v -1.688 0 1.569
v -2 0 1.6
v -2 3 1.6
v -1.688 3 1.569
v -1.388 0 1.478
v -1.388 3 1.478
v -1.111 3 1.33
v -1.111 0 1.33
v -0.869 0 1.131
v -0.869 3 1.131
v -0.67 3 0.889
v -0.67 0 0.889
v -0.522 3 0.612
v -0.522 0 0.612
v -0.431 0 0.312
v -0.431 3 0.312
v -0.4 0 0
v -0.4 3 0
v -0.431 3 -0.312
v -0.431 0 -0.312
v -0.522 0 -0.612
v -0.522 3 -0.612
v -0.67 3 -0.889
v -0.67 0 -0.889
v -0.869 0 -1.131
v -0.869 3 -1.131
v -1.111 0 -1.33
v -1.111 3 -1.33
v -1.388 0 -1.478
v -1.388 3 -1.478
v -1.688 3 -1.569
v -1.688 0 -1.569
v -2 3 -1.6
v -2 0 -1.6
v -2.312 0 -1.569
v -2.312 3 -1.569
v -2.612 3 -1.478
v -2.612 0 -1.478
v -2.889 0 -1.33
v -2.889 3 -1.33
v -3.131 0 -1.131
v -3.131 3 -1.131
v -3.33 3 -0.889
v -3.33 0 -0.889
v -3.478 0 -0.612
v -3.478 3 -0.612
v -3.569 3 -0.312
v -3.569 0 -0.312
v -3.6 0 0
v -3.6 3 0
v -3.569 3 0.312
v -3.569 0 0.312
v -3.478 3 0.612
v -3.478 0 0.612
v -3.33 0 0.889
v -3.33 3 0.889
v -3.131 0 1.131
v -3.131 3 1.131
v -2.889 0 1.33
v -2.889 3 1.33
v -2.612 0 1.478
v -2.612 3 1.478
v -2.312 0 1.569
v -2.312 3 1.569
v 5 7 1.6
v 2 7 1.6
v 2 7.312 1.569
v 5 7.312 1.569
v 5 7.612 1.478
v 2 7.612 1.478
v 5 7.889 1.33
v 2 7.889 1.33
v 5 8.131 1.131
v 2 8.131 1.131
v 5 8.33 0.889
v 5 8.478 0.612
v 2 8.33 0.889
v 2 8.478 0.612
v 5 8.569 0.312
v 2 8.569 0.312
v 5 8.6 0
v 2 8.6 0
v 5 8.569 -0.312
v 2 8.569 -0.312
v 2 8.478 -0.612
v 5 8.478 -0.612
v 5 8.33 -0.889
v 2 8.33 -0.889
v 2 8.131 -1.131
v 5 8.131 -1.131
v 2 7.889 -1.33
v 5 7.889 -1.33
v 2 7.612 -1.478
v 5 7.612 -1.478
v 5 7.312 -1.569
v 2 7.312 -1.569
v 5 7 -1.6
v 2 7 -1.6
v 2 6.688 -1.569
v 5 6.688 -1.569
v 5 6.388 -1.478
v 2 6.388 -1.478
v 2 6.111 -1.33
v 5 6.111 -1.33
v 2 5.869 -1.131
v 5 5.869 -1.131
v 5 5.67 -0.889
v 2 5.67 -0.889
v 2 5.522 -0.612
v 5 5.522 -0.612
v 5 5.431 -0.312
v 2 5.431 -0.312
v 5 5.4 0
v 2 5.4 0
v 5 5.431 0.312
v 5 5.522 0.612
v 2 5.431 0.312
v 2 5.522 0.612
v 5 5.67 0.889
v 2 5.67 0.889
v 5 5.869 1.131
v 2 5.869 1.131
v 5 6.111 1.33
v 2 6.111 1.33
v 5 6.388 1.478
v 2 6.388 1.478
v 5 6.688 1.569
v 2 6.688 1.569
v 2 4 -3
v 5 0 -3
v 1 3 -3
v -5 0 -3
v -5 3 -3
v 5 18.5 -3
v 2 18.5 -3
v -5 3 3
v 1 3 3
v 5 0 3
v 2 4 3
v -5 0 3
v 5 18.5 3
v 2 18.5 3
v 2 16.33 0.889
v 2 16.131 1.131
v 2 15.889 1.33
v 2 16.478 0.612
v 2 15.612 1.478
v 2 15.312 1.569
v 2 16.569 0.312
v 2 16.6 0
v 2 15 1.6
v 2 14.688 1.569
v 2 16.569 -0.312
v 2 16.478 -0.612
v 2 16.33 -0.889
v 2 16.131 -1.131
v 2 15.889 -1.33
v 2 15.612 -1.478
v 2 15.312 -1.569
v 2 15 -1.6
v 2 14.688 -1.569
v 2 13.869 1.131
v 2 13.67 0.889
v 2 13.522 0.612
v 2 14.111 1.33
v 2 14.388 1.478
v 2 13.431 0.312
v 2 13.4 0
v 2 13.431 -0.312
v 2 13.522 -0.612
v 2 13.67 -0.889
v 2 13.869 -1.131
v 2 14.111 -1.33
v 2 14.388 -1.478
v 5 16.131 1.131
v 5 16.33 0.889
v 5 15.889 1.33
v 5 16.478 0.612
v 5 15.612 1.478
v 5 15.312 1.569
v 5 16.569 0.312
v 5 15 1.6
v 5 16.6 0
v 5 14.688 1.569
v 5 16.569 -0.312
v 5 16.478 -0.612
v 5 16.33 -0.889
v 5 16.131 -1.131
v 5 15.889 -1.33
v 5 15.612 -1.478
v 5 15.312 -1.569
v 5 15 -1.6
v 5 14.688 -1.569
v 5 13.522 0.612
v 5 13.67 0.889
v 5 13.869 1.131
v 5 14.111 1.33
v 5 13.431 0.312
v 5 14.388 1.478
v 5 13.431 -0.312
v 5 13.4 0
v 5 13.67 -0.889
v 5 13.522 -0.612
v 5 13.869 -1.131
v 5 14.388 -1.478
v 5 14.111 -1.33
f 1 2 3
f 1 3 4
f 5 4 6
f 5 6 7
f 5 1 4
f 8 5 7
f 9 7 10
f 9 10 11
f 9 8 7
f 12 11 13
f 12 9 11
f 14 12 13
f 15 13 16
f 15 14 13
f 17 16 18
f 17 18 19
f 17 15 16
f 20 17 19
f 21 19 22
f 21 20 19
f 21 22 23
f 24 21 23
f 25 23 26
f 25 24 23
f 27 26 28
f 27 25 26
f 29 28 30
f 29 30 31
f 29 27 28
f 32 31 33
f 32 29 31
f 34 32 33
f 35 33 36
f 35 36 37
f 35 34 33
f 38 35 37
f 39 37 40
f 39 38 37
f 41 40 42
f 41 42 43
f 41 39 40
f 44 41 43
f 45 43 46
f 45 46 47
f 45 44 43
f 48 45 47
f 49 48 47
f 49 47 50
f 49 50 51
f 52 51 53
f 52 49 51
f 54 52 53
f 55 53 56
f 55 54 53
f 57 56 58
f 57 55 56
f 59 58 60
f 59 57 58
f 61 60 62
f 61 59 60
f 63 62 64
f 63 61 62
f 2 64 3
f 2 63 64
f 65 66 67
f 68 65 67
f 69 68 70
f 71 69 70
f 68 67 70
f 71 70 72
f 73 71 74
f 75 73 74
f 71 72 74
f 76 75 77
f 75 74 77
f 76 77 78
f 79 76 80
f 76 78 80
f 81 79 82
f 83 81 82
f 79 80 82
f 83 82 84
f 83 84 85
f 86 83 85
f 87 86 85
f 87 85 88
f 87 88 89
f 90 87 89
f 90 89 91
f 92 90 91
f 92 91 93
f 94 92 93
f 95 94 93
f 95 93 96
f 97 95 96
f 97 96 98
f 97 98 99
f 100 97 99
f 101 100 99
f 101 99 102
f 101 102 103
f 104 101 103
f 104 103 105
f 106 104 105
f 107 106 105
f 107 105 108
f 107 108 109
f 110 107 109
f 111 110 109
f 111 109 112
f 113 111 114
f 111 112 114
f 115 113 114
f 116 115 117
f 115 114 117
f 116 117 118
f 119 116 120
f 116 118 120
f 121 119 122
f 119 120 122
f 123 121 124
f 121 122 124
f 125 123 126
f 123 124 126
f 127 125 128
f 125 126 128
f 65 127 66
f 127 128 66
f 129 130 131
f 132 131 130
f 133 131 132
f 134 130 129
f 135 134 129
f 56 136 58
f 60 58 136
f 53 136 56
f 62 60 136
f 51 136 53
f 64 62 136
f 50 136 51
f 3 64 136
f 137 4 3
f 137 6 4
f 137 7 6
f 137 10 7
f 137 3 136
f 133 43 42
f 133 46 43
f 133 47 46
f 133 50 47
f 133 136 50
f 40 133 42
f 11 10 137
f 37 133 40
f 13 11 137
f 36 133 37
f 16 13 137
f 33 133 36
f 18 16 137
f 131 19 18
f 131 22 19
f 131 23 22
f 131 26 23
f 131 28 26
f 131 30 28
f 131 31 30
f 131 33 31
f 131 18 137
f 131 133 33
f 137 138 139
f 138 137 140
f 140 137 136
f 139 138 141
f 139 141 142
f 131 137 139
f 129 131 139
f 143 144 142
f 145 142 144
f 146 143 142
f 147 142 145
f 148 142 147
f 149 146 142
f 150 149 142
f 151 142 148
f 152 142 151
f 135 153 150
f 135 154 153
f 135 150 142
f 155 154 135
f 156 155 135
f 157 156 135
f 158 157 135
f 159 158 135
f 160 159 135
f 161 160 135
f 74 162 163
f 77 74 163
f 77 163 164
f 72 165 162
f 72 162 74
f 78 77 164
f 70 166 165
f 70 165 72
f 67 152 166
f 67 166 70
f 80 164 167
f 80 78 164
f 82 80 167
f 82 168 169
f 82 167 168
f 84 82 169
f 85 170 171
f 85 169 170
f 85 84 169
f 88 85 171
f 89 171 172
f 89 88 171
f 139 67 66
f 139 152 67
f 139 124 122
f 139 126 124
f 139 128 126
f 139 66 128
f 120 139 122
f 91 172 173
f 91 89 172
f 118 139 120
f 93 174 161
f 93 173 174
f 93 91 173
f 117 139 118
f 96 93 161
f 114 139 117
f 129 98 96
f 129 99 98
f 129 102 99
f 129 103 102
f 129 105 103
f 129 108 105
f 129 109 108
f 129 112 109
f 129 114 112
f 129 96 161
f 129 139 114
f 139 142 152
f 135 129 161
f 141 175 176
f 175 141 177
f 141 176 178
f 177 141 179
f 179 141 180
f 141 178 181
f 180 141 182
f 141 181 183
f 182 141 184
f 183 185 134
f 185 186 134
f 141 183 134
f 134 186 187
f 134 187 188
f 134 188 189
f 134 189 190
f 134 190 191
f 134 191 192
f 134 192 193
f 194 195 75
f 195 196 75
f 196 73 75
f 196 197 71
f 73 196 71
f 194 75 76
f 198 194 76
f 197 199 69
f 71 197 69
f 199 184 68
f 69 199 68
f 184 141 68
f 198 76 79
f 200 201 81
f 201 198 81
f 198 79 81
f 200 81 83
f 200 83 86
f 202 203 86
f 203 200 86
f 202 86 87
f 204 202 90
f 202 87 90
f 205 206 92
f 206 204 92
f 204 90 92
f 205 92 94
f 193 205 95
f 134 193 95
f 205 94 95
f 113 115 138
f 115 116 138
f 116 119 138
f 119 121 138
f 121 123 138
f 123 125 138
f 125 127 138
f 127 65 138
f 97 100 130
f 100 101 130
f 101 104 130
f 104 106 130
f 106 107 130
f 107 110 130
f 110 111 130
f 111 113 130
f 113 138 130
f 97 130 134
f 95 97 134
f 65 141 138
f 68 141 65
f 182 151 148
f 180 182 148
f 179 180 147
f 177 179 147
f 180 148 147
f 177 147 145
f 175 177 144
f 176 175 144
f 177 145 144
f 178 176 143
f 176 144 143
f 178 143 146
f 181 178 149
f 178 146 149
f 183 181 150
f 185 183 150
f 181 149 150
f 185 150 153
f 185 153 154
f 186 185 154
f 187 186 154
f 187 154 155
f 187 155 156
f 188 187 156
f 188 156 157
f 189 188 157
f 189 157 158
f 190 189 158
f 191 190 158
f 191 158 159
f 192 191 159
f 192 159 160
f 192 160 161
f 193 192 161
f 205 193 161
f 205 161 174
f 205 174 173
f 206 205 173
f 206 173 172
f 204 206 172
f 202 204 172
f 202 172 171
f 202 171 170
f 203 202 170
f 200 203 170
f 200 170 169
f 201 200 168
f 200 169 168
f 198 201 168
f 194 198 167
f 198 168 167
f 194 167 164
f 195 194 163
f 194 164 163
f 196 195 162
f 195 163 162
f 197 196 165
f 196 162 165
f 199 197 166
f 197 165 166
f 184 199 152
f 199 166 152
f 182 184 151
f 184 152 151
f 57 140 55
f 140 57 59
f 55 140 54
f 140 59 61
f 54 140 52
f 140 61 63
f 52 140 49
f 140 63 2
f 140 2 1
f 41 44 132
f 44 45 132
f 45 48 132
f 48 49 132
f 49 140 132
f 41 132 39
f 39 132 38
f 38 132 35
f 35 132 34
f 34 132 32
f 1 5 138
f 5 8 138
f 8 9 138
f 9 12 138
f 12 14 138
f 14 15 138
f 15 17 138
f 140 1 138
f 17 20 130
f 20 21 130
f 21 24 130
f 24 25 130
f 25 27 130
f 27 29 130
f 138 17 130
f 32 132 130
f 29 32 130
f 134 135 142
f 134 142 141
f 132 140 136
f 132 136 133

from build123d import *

# Parameters (mm, degrees)
SKETCH1_W           = 10
SKETCH1_H           = 6
SKETCH1_R           = 1.6
BOSS_EXTRUDE1_DEPTH = 3
SKETCH2_W           = 3
SKETCH2_H           = 6
BOSS_EXTRUDE2_DEPTH = 15.5
SKETCH3_R           = 1.6
CUT_EXTRUDE1_DEPTH  = 21.006249024
BOSS_EXTRUDE3_DEPTH = 6


with BuildPart() as part:
    # Sketch1 → Boss-Extrude1 (new body)
    with BuildSketch(Plane(origin=(0, 0, 0), x_dir=(1, 0, 0), z_dir=(0, 1, 0))):
        Rectangle(SKETCH1_W, SKETCH1_H)
        with Locations(Location((-2, 0, 0), (0, 0, 270))):
            Circle(SKETCH1_R, mode=Mode.SUBTRACT)
    extrude(amount=BOSS_EXTRUDE1_DEPTH)

    # Sketch2 → Boss-Extrude2 (add)
    with BuildSketch(Plane(origin=(0, 3, 0), x_dir=(1, 0, 0), z_dir=(0, 1, 0))):
        with Locations((3.5, 0)):
            Rectangle(SKETCH2_W, SKETCH2_H)
    extrude(amount=BOSS_EXTRUDE2_DEPTH)

    # Sketch3 → Cut-Extrude1 (cut, through all)
    with BuildSketch(Plane.ZY.offset(-2)):
        with Locations((0, 7)):
            Circle(SKETCH3_R)
        with Locations((0, 15)):
            Circle(SKETCH3_R)
    extrude(amount=-CUT_EXTRUDE1_DEPTH, mode=Mode.SUBTRACT)

    # Sketch5 → Boss-Extrude3 (add)
    with BuildSketch(Plane(origin=(2, 3, 3), x_dir=(1, 0, 0), z_dir=(0, 0, 1))):
        Polygon((-1, 0), (0, 1), (0, 0), align=None)
    extrude(amount=-BOSS_EXTRUDE3_DEPTH)


solid = part.part
